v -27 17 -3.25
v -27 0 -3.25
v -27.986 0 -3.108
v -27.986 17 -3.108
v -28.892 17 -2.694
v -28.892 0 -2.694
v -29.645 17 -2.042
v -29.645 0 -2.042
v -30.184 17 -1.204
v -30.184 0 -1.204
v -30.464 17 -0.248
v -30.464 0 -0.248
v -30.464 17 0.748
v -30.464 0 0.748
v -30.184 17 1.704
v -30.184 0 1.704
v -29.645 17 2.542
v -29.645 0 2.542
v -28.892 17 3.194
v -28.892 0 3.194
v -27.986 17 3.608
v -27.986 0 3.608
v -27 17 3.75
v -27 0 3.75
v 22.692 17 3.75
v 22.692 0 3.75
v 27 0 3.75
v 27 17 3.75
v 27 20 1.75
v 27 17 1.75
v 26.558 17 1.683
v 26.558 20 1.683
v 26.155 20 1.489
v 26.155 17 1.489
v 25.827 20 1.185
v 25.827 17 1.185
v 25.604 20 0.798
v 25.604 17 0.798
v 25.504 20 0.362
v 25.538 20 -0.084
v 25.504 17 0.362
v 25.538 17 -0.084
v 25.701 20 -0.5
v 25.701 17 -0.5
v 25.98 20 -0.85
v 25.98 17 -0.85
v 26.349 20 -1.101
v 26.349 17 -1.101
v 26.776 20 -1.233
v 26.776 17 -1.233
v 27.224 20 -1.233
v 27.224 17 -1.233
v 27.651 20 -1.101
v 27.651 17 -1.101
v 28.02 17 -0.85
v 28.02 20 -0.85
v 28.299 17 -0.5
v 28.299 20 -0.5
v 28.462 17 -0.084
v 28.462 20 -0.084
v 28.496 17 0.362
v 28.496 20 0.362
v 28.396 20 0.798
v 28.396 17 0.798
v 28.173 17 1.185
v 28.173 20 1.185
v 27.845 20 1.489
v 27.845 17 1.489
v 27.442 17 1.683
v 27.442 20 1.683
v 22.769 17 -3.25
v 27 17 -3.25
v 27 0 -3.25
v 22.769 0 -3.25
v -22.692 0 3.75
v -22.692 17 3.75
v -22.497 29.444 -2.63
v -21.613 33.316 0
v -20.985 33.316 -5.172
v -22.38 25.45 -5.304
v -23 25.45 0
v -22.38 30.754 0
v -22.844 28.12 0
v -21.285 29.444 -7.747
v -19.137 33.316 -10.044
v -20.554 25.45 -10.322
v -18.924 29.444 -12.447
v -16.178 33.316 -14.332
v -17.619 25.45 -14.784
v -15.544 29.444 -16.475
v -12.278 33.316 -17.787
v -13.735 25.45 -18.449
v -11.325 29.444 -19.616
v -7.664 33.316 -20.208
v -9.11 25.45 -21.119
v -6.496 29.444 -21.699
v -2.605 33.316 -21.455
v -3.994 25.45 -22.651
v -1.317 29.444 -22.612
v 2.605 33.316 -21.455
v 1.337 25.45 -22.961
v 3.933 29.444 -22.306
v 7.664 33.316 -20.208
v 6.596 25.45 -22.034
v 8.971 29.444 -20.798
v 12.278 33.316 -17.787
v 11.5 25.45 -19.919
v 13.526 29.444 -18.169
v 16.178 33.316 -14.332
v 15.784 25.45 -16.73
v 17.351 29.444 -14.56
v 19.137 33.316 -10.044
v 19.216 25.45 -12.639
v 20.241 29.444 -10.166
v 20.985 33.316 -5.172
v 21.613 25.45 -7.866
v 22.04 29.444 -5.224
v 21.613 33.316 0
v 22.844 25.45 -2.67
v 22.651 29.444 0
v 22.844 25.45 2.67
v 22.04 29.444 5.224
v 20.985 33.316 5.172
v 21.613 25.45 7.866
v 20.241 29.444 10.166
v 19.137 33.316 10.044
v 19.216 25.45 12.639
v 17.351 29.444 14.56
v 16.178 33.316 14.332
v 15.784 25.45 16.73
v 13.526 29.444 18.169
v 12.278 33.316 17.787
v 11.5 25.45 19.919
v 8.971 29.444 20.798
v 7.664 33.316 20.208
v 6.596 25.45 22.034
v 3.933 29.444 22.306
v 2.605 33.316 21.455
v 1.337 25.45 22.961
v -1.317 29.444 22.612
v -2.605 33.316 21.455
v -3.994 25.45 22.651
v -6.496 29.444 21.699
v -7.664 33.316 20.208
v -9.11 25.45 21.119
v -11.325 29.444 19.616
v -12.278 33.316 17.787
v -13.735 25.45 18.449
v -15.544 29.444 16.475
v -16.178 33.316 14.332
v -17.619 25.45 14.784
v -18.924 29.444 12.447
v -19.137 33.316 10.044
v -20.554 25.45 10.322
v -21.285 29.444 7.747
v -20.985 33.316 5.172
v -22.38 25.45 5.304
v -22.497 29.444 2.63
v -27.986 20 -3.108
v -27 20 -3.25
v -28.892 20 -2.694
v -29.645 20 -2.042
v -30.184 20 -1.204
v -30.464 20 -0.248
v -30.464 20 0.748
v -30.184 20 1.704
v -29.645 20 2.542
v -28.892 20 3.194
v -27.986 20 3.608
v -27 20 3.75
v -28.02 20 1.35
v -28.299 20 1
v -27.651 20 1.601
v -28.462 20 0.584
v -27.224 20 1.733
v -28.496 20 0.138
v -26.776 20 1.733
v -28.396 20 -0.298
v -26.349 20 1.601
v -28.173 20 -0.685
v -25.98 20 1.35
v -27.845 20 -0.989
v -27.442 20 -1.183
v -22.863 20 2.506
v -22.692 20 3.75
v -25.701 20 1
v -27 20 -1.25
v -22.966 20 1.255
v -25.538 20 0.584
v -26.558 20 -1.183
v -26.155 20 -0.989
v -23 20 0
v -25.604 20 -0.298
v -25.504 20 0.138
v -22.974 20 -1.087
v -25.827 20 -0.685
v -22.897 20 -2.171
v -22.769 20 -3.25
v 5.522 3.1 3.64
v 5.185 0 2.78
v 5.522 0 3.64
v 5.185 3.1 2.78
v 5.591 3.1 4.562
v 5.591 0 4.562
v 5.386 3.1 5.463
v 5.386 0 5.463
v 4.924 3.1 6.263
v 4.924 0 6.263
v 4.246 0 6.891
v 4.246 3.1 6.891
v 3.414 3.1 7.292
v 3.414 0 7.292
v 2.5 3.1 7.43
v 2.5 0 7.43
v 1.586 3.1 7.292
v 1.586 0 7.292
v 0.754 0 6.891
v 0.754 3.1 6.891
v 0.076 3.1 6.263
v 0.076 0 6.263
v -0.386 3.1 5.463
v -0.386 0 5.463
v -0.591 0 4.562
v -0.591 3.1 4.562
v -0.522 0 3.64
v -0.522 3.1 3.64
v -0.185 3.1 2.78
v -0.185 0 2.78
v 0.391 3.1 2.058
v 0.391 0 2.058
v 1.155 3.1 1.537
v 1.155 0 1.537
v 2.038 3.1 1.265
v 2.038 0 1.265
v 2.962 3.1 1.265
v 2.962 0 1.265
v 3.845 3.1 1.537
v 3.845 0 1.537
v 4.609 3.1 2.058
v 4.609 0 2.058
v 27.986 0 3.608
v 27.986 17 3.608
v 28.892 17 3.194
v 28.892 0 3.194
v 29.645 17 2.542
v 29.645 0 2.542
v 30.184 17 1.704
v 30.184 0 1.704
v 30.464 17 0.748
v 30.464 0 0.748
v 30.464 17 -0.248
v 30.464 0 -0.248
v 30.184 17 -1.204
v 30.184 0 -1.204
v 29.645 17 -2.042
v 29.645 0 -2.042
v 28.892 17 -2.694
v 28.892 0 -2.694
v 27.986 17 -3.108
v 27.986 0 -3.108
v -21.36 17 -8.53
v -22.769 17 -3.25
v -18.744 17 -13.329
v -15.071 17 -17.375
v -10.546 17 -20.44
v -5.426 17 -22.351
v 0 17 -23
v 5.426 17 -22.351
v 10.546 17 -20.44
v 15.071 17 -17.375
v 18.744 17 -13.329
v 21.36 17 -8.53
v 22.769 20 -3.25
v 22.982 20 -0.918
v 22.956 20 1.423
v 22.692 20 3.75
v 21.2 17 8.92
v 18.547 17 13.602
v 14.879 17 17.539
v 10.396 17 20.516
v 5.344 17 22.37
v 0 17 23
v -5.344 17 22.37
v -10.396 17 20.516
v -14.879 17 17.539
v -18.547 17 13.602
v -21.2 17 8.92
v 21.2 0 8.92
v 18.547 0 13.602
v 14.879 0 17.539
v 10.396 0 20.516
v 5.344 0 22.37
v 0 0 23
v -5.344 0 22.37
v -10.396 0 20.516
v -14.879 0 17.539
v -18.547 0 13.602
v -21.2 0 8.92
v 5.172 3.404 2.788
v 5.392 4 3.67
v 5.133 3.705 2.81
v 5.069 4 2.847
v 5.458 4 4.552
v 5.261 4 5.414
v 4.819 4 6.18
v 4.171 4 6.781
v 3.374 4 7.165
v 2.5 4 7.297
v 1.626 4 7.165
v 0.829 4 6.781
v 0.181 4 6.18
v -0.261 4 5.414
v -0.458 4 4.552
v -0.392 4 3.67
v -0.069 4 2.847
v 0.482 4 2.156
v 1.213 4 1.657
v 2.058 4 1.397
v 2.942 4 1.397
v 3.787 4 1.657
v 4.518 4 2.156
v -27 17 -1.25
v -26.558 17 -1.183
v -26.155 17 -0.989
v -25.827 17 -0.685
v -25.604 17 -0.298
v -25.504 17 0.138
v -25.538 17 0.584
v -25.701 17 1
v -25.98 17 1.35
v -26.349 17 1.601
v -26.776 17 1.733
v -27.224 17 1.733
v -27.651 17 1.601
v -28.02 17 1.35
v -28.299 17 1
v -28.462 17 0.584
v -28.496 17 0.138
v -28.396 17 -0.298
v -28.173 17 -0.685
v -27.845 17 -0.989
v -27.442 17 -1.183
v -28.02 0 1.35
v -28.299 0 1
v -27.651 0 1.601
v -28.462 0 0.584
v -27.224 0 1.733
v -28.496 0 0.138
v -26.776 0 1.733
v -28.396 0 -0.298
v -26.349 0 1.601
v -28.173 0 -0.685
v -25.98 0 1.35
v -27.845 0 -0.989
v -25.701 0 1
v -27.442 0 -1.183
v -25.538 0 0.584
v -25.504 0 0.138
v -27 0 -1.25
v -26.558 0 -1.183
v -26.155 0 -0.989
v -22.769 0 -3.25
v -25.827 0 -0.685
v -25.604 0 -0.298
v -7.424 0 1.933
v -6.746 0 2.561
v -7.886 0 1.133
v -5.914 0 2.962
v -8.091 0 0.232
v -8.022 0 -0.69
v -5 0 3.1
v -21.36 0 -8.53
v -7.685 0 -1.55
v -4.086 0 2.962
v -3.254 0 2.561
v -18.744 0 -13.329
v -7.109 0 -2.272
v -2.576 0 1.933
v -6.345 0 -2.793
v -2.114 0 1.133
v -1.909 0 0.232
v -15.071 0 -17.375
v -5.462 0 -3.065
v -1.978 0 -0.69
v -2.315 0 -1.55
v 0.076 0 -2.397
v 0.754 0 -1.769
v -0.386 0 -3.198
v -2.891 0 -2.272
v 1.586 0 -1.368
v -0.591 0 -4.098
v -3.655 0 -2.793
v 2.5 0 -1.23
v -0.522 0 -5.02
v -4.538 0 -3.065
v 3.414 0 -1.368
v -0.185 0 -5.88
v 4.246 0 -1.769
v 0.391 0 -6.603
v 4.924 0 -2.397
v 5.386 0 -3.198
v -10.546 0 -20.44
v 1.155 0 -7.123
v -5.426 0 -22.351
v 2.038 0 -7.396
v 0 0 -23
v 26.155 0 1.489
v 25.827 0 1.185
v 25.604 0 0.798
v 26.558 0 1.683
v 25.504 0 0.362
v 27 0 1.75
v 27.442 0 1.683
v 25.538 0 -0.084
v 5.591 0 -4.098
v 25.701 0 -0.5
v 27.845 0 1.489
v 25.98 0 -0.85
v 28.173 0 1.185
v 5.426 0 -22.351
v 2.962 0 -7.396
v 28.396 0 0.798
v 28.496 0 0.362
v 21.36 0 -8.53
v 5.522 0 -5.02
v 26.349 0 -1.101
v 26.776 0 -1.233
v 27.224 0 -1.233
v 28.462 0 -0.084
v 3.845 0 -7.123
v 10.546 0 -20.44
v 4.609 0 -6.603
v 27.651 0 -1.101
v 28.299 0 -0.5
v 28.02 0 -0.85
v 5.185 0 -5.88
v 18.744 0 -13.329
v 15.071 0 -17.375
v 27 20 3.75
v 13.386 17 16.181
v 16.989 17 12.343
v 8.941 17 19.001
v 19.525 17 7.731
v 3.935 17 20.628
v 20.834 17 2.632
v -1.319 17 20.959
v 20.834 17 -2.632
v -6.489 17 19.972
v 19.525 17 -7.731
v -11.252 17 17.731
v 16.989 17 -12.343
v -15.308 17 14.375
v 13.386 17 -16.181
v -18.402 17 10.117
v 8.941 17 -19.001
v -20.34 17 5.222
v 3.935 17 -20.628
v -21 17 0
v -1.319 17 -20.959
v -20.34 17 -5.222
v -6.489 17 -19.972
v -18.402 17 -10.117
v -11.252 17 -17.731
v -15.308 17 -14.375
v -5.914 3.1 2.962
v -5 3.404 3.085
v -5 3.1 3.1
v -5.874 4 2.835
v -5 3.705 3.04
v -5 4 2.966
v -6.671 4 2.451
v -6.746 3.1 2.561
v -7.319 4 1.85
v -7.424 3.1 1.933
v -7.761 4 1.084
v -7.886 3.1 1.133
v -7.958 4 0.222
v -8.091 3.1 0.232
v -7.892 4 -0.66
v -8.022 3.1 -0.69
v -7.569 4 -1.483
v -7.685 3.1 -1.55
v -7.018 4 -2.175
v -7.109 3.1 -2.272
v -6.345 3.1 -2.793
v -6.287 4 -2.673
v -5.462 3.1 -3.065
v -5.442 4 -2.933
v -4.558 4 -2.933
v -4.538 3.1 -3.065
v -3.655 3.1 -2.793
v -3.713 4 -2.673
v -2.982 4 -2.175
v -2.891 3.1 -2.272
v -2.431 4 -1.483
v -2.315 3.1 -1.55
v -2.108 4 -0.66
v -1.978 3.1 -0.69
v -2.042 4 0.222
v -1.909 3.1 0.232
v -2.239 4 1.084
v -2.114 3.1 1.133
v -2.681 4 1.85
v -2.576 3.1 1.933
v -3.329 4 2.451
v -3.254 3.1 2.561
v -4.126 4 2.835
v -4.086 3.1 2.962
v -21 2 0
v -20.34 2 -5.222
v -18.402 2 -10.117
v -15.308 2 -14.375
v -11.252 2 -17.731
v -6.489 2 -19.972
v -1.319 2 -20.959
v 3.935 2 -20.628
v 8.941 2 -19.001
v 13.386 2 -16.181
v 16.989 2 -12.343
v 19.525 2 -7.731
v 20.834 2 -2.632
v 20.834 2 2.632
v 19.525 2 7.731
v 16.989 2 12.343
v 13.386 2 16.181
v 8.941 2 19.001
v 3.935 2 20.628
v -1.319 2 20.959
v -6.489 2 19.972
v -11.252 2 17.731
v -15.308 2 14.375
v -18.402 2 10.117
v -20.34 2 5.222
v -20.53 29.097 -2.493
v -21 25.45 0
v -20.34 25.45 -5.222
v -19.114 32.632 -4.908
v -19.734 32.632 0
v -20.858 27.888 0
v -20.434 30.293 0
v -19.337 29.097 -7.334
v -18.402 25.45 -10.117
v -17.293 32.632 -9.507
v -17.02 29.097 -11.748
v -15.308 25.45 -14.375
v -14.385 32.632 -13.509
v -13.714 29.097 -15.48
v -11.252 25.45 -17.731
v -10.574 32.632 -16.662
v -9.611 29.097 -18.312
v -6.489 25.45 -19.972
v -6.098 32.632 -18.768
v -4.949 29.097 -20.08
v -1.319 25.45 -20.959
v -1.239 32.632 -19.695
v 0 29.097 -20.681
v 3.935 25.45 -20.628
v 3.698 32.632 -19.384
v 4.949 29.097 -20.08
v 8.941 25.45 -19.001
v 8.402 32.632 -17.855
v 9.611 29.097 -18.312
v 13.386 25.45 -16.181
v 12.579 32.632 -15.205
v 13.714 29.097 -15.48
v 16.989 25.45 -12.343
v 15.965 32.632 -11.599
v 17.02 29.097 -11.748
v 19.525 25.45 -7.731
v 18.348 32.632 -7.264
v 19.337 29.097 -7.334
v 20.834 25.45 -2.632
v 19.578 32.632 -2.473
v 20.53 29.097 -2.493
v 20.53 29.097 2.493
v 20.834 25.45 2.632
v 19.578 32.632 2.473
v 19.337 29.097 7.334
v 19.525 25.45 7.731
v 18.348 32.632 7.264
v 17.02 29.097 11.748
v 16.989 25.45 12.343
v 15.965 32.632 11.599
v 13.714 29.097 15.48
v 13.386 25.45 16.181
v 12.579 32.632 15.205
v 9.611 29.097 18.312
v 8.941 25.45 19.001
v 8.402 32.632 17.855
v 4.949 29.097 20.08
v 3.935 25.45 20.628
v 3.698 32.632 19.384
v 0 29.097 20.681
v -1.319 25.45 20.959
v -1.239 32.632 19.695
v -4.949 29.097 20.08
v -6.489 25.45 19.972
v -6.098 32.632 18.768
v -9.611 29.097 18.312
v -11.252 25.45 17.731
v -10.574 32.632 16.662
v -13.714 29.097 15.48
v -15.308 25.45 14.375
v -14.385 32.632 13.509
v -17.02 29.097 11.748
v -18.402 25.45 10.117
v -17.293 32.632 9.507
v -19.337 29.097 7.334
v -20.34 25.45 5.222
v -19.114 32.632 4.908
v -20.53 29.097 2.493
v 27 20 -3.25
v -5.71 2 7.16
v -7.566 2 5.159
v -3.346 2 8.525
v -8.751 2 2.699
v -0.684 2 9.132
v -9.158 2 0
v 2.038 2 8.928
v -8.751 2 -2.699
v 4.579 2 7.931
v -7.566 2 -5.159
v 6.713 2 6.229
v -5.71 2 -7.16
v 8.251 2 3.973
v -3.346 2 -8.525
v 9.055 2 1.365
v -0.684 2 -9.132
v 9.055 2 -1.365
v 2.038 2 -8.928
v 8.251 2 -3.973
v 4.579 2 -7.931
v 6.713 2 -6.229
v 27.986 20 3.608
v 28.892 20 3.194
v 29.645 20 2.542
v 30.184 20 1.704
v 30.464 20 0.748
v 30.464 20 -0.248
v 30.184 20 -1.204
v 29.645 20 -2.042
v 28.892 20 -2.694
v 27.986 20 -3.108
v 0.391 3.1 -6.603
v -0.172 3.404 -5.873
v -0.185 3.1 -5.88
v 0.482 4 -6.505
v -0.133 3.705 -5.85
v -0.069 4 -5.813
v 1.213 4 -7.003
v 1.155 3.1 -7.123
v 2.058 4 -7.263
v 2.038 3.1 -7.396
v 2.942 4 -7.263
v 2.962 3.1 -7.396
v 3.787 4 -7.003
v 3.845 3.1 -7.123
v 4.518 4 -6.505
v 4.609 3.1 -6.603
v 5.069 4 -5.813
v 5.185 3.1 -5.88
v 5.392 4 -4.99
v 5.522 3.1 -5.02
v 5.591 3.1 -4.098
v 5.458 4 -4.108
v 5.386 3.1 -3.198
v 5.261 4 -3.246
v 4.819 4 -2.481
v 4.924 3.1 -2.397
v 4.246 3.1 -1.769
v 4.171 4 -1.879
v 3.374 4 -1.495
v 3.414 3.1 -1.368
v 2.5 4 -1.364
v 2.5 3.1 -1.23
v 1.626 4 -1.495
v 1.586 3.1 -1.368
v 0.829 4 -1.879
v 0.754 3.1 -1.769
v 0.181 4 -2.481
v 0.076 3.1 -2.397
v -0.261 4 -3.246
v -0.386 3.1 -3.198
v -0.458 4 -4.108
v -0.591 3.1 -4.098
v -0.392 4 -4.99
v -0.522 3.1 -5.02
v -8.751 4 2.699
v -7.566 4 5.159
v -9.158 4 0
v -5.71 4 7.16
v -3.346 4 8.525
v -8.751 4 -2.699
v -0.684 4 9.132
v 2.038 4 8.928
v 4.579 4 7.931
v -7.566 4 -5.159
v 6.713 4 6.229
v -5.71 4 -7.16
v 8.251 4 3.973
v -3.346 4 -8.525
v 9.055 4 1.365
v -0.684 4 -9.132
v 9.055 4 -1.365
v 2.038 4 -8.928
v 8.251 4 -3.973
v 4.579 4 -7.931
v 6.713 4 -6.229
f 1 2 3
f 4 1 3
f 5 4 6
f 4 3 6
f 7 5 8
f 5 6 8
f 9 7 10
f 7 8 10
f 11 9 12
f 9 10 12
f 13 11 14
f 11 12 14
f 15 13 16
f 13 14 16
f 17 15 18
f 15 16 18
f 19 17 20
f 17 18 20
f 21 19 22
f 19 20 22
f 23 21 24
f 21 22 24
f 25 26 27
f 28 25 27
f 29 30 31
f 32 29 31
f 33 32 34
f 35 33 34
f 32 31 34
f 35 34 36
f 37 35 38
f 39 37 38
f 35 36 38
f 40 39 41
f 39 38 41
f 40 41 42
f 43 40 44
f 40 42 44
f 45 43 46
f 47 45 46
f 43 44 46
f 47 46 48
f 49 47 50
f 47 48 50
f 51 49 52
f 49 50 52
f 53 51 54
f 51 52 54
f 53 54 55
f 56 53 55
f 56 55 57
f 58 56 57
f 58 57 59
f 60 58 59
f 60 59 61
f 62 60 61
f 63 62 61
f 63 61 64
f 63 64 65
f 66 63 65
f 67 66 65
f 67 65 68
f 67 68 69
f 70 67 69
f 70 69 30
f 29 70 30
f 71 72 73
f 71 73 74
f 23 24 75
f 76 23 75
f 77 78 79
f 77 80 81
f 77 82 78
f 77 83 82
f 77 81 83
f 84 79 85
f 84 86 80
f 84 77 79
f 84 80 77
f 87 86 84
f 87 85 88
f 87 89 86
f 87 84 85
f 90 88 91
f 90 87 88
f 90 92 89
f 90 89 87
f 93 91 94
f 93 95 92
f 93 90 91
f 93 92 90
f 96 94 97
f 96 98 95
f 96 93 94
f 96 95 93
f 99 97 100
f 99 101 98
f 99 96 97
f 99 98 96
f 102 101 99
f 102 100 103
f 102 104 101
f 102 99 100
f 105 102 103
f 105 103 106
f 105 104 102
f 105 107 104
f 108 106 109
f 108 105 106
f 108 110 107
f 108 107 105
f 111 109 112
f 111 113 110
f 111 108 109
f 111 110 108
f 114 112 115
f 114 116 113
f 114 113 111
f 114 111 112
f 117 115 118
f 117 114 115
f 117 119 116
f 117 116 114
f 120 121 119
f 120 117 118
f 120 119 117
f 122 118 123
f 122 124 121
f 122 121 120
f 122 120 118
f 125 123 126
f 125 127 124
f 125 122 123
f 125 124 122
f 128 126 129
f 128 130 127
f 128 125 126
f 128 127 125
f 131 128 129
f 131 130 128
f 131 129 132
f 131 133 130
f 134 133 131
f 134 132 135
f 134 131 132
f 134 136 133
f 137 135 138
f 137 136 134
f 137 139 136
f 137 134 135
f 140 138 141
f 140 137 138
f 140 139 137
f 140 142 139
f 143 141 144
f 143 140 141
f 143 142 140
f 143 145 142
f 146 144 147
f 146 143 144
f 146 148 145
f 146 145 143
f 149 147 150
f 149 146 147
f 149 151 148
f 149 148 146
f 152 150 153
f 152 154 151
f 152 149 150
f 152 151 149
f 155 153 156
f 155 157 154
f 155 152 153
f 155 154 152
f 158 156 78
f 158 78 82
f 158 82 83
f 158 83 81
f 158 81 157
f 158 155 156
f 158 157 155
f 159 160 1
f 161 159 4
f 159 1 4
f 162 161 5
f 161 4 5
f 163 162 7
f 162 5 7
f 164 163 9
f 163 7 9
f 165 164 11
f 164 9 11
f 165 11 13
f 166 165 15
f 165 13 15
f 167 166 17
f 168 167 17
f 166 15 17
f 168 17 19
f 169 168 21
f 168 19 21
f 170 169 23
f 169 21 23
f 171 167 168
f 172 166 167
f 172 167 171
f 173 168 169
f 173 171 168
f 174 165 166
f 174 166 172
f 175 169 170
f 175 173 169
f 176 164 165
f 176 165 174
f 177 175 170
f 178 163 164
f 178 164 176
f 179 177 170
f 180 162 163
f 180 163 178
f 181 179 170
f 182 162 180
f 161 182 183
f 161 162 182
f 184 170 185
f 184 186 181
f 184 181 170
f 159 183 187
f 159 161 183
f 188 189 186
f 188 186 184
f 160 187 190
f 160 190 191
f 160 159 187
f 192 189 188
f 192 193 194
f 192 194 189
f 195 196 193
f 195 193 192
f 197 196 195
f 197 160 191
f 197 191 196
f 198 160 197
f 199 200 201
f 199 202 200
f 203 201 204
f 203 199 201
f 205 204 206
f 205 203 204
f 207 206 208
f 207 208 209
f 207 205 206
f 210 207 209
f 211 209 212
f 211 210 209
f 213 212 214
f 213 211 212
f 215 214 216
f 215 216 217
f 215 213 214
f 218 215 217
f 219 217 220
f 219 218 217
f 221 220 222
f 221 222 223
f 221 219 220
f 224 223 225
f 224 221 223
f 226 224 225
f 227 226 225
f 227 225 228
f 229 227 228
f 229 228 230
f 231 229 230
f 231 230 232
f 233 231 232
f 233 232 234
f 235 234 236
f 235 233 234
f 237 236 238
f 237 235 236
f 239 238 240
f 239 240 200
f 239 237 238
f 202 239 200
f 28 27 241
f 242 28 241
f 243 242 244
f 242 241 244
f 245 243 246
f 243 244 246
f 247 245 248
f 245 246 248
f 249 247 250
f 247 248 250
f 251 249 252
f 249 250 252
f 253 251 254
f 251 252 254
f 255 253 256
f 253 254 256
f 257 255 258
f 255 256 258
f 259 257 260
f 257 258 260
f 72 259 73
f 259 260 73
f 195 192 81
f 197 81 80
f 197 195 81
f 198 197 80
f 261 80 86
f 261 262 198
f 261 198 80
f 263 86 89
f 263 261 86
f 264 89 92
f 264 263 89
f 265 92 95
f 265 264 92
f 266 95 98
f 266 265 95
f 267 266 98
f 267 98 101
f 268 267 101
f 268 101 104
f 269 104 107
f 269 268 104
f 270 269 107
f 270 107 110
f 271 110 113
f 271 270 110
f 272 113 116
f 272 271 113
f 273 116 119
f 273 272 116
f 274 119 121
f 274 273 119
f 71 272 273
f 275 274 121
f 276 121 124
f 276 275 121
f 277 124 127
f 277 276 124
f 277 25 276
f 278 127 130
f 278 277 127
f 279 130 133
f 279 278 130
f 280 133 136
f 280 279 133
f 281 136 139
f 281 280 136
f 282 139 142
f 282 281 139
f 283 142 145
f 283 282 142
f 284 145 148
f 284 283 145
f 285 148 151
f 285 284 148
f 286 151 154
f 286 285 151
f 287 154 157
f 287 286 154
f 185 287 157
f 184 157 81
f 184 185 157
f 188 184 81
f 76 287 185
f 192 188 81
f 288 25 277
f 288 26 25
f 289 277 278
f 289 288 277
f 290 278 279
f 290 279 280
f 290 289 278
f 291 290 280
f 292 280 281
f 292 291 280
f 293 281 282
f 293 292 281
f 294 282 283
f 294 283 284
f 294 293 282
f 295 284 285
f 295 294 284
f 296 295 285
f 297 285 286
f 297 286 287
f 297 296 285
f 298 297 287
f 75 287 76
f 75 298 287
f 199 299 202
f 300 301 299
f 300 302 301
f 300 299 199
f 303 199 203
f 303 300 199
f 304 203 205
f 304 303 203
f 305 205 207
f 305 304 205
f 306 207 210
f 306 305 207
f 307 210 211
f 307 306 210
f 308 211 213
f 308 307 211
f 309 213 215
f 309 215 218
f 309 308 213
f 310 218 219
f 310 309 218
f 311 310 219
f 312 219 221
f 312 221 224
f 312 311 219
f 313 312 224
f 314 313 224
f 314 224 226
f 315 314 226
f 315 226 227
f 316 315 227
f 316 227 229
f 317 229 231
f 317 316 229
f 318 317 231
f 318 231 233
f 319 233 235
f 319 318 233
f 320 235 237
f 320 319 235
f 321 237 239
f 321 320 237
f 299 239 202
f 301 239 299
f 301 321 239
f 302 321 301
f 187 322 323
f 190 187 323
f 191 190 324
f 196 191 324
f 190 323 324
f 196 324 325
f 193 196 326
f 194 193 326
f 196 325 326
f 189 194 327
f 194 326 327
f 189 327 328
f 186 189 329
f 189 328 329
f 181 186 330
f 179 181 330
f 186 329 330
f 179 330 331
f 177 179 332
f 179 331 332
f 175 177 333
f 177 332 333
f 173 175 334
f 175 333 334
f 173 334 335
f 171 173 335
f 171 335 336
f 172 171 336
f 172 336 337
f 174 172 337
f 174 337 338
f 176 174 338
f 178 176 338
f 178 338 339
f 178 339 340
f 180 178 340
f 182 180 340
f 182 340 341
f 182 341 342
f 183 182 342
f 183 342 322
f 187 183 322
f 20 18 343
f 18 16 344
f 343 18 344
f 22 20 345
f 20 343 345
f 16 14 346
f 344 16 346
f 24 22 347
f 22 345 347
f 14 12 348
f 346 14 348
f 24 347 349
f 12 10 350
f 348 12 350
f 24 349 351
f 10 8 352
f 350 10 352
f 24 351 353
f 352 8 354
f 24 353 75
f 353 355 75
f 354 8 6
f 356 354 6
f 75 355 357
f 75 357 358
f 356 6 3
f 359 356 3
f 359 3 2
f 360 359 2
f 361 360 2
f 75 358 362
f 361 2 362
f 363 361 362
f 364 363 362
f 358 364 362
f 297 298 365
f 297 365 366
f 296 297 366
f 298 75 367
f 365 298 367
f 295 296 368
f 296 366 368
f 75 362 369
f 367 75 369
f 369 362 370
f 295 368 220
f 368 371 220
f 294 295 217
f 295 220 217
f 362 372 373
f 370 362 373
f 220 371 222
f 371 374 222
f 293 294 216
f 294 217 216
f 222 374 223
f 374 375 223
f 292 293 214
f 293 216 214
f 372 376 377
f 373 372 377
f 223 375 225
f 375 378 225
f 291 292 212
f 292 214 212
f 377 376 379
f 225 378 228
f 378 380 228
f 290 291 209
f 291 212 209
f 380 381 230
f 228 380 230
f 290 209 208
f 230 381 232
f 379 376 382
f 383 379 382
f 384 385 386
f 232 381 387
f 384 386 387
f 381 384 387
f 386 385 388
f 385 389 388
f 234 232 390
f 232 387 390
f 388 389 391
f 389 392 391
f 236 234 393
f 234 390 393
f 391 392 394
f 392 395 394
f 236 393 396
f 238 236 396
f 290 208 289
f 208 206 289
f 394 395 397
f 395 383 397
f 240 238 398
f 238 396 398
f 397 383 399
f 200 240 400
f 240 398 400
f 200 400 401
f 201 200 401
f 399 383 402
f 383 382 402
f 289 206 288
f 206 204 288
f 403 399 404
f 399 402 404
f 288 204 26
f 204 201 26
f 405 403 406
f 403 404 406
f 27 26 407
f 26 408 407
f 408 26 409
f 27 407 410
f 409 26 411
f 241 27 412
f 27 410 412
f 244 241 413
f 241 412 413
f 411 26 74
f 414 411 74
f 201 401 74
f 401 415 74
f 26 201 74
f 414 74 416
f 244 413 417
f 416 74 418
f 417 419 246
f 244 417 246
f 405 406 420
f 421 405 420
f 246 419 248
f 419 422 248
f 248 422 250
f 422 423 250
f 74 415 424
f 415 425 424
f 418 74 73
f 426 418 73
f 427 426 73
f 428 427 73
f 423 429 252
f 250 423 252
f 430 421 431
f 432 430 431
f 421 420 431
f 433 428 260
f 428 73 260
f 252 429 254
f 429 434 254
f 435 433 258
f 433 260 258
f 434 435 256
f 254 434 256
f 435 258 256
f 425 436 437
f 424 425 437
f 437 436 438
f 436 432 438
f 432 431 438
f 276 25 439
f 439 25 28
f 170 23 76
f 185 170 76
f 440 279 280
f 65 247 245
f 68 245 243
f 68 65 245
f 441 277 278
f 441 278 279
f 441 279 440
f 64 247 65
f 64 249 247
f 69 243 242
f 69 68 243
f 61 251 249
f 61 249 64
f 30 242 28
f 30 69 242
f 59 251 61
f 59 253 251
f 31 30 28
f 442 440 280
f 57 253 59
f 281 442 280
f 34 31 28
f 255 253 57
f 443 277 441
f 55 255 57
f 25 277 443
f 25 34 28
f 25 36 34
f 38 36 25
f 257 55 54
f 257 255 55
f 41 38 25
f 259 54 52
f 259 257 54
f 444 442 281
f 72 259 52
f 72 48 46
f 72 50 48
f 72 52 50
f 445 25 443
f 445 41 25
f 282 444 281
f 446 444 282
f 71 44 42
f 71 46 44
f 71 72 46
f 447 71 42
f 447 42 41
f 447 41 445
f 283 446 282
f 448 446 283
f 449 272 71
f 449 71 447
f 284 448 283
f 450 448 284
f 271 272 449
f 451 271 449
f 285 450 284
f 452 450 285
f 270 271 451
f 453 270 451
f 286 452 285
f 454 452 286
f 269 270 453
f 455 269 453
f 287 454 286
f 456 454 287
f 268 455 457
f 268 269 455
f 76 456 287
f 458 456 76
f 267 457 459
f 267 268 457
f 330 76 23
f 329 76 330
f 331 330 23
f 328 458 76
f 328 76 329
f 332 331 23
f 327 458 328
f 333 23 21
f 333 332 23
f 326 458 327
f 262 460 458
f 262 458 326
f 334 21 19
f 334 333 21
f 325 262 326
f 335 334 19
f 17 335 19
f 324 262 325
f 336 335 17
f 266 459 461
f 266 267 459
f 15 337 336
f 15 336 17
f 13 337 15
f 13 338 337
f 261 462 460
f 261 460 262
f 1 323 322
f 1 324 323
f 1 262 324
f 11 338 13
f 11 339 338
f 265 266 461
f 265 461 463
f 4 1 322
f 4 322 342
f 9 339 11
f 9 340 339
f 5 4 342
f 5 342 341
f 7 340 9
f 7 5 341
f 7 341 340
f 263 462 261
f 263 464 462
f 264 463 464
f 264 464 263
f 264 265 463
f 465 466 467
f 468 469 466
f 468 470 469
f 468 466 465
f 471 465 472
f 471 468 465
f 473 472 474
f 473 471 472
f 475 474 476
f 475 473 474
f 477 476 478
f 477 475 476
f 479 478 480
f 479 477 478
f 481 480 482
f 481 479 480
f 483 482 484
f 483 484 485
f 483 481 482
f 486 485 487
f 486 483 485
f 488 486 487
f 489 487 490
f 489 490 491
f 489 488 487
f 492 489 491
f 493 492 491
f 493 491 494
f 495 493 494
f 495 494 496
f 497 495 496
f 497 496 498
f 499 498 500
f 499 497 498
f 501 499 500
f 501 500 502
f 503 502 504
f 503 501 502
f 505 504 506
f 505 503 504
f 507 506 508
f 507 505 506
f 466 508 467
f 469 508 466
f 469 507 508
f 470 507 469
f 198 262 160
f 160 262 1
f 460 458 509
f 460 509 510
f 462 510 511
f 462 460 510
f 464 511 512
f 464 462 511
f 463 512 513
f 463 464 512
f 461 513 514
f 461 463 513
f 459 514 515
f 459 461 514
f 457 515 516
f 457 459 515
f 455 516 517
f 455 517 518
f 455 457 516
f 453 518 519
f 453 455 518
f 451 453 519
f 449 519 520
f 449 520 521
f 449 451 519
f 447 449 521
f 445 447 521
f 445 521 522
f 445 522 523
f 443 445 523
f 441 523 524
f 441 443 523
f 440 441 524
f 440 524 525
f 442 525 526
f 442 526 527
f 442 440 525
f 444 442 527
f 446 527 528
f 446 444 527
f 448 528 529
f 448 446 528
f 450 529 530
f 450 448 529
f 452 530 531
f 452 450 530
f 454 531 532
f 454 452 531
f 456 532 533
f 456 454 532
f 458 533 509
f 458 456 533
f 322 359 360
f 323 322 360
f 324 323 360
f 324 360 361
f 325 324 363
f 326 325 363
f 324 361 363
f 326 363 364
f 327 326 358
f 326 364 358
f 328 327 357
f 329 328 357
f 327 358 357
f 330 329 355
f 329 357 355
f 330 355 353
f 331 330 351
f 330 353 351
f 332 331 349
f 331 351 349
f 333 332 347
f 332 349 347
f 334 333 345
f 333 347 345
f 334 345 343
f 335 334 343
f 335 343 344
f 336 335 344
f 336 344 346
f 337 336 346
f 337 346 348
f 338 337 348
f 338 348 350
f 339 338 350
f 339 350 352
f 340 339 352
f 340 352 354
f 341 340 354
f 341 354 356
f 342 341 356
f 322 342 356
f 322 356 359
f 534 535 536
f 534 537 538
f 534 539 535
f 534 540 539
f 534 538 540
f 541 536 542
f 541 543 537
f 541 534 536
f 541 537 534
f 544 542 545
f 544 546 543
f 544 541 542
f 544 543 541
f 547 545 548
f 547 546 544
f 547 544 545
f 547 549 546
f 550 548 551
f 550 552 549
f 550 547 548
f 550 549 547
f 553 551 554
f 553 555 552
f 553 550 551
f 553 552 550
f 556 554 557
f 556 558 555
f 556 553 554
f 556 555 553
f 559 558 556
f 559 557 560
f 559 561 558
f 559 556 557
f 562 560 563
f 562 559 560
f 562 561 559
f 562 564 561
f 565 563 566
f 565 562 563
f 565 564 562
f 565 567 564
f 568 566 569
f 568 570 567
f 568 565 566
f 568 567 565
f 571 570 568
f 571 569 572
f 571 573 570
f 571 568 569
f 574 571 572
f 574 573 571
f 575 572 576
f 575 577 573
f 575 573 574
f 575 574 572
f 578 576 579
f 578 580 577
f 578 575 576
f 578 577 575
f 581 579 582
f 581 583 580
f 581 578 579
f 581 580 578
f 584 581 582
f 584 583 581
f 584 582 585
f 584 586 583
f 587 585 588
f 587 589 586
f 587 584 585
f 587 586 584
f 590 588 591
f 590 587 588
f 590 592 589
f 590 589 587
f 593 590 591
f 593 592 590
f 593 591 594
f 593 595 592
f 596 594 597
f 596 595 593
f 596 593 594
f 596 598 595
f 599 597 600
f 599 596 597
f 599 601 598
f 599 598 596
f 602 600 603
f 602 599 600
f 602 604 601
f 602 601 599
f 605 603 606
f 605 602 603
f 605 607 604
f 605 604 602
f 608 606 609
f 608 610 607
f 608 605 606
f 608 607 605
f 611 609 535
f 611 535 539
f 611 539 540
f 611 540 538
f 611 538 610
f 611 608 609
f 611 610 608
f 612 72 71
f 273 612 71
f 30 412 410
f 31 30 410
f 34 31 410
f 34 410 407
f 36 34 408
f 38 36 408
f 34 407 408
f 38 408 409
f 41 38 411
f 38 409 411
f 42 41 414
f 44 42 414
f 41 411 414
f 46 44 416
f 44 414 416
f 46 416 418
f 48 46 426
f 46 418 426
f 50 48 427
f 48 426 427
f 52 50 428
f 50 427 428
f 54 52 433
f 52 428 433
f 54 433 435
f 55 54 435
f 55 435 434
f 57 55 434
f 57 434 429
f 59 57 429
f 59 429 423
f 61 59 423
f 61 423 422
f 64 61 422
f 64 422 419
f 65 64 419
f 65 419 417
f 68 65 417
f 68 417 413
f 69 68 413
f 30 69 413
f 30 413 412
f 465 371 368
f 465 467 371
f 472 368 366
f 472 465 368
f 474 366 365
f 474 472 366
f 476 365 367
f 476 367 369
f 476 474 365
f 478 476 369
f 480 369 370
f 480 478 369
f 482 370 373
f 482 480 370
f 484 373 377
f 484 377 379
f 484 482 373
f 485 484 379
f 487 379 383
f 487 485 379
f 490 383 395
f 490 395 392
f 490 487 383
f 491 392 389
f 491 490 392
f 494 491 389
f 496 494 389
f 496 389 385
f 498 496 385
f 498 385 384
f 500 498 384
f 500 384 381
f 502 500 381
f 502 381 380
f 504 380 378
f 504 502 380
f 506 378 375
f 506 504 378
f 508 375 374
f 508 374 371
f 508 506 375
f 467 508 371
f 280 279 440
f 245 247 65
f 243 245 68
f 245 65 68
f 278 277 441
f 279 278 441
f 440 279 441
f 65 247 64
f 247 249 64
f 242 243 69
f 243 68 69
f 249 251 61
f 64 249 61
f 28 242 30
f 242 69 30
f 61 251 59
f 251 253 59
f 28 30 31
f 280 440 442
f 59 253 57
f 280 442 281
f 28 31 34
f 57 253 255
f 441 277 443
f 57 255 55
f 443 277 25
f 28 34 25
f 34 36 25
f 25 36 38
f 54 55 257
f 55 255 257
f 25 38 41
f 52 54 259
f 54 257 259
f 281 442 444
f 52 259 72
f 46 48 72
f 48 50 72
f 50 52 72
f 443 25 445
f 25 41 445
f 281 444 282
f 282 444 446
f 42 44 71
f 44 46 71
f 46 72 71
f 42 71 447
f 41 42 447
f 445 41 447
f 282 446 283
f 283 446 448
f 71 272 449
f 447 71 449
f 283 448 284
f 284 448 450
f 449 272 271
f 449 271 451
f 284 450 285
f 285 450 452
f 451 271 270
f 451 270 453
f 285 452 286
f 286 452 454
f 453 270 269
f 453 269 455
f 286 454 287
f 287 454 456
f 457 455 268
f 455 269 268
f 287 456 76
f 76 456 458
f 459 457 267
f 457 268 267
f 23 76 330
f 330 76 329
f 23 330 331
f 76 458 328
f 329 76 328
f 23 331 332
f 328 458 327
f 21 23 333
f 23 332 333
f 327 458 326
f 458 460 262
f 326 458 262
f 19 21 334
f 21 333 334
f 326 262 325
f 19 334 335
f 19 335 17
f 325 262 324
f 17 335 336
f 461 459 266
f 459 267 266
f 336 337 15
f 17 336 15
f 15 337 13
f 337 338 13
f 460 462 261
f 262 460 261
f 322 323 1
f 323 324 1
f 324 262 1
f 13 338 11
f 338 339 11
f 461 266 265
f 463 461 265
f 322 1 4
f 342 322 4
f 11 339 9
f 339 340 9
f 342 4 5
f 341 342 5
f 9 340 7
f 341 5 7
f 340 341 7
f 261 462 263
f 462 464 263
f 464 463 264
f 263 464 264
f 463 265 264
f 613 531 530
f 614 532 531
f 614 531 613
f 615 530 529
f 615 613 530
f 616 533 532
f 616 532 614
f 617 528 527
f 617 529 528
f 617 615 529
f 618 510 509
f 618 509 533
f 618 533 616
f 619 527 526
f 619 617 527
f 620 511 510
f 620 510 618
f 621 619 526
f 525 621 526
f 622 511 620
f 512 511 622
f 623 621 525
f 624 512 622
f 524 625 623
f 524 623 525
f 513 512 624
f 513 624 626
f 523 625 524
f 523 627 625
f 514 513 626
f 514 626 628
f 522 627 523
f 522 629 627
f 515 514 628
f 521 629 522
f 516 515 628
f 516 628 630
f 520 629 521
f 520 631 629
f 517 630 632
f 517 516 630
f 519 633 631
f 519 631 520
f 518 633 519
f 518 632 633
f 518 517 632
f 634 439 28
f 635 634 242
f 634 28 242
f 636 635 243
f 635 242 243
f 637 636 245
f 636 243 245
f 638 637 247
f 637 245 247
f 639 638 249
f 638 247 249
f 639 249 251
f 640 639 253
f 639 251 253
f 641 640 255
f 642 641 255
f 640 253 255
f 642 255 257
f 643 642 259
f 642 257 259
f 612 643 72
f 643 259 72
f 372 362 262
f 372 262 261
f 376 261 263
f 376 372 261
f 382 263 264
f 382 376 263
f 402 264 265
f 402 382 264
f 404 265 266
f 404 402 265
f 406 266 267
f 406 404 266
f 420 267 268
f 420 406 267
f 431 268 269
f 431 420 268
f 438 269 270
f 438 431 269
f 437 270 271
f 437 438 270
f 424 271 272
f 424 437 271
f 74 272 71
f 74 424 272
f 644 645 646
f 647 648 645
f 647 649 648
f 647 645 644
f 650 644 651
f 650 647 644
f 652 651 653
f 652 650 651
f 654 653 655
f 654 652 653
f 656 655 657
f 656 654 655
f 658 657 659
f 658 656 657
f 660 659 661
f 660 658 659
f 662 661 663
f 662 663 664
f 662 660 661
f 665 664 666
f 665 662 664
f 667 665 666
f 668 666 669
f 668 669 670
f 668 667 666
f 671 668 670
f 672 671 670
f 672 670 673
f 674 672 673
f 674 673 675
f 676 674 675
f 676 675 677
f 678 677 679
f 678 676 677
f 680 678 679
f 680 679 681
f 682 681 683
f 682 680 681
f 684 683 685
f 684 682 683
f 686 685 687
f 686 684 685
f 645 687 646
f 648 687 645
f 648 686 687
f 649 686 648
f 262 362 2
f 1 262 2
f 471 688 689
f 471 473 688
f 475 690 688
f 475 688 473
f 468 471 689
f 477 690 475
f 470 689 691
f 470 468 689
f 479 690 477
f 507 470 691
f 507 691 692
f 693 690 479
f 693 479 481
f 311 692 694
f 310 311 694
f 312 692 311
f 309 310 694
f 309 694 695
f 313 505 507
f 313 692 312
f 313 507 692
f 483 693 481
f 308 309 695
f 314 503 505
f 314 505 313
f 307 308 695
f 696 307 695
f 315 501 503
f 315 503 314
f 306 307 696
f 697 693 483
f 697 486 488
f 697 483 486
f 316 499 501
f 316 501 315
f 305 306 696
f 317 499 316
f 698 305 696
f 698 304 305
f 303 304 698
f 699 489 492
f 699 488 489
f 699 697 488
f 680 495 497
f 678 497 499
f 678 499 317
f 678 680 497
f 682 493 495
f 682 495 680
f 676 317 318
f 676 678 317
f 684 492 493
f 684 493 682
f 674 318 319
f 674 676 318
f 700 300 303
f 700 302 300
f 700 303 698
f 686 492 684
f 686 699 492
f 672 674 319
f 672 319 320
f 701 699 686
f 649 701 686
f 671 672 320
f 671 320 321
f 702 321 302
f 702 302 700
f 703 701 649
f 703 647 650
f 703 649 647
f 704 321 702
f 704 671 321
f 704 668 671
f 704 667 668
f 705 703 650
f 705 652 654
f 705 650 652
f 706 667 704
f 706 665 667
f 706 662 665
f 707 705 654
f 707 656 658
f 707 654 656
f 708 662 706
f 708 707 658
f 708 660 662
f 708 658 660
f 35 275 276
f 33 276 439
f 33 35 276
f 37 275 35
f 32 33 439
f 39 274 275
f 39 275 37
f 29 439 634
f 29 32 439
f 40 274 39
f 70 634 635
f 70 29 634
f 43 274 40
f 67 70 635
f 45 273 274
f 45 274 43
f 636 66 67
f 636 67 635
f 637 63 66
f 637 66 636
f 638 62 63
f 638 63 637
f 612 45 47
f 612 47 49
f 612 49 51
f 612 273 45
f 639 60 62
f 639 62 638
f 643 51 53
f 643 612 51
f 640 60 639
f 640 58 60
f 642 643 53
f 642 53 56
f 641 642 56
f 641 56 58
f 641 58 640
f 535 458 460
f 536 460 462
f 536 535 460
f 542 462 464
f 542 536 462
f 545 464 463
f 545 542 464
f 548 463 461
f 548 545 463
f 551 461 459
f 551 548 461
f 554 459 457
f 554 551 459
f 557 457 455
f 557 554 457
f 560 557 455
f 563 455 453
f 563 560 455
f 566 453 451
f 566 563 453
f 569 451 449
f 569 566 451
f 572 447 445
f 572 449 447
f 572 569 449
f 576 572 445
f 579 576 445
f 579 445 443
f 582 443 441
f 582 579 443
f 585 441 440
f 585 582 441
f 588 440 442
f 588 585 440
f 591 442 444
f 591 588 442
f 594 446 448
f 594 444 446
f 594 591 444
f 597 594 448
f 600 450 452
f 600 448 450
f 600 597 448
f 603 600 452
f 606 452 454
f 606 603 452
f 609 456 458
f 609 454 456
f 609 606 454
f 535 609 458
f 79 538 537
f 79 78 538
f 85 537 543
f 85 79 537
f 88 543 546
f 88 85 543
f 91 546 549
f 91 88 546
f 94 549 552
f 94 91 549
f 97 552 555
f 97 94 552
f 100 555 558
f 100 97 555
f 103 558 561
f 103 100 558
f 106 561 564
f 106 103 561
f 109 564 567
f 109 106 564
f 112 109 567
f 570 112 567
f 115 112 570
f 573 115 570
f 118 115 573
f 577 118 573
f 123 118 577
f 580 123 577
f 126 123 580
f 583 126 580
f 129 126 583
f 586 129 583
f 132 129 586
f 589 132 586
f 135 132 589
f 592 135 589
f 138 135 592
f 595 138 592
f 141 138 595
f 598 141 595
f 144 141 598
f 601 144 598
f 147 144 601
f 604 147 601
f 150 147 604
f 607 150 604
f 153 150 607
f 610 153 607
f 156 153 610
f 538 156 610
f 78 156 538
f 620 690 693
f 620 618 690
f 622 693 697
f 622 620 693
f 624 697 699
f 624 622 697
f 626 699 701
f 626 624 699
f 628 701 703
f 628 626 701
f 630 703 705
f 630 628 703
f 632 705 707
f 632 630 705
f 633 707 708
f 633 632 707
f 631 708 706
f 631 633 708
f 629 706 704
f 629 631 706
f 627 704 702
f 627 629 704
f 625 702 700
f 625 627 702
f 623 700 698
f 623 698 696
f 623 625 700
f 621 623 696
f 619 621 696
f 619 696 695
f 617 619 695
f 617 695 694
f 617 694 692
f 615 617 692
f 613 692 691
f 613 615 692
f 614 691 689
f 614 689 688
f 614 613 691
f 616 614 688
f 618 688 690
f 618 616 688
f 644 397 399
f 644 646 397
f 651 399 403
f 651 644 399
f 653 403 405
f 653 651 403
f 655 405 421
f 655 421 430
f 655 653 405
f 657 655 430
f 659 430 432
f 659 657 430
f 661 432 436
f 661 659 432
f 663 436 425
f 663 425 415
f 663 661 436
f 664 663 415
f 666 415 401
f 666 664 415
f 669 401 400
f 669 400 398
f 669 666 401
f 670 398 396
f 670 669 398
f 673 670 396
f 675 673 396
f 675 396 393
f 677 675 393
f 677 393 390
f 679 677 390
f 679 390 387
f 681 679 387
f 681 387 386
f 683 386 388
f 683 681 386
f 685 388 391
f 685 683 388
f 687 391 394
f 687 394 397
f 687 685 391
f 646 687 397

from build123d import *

# Parameters (mm, degrees)
SKETCH5_R           = 1.5
BOSS_EXTRUDE3_DEPTH = 20
CIRPATTERN1_COUNT   = 3


with BuildPart() as part:
    # Sketch4 → Revolve1 (revolve)
    with BuildSketch(Plane.XY):
        with BuildLine():
            Line((-21, 2), (-21, 4))
            Line((-21, 4), (-21, 25.449944321))
            ThreePointArc((-21, 25.449944321), (-20.680962813, 29.096556052), (-19.733545037, 32.63236733))
            Line((-19.733545037, 32.63236733), (-21.612930278, 33.316407617))
            ThreePointArc((-21.612930278, 33.316407617), (-22.650578319, 29.443852407), (-23, 25.449944321))
            Line((-23, 25.449944321), (-23, 0))
            Line((-23, 0), (-21, 0))
            Line((-21, 0), (0, 0))
            Line((0, 0), (0, 4))
            Line((0, 4), (-9.157677286, 4))
            Line((-9.157677286, 4), (-9.157677286, 2))
            Line((-9.157677286, 2), (-21, 2))
        make_face()
    revolve(axis=Axis((0, 25.449944321, 0), (0, -1, 0)))

    # Sketch5 → Boss-Extrude3 (add)
    # profile 1 of 2: a face of its own
    with BuildSketch(Plane(origin=(0, 0, 0), x_dir=(-1, 0, 0), z_dir=(0, -1, 0))):
        with BuildLine():
            Line((27, -3.75), (22.692234355, -3.75))
            ThreePointArc((22.692234355, -3.75), (22.998609049, -0.252946238), (22.769222648, 3.25))
            Line((22.769222648, 3.25), (27, 3.25))
            ThreePointArc((27, 3.25), (30.5, -0.25), (27, -3.75))
        make_face()
        with Locations((27, -0.25)):
            Circle(SKETCH5_R, mode=Mode.SUBTRACT)
    # profile 2 of 2: a face of its own
    with BuildSketch(Plane(origin=(0, 0, 0), x_dir=(-1, 0, 0), z_dir=(0, -1, 0))):
        with BuildLine():
            Line((-27, 3.25), (-22.769222648, 3.25))
            ThreePointArc((-22.769222648, 3.25), (-22.998609049, -0.252946238), (-22.692234355, -3.75))
            Line((-22.692234355, -3.75), (-27, -3.75))
            ThreePointArc((-27, -3.75), (-30.5, -0.25), (-27, 3.25))
        make_face()
        with Locations((-27, -0.25)):
            Circle(SKETCH5_R, mode=Mode.SUBTRACT)
    extrude(amount=-BOSS_EXTRUDE3_DEPTH)

    # Sketch7 → Cut-Revolve1 (revolve, cut)
    with BuildSketch(Plane(origin=(0, 0, 0), x_dir=(1, 0, 0), z_dir=(0, 0, -1))):
        with BuildLine():
            Line((-5, 0), (-8.1, 0))
            Line((-8.1, 0), (-8.1, -3.1))
            ThreePointArc((-8.1, -3.1), (-7.192031022, -5.292031022), (-5, -6.2))
            Line((-5, -6.2), (-5, 0))
        make_face()
    cut_revolve1 = revolve(axis=Axis((-5, 6.2, 0), (0, -1, 0)), mode=Mode.SUBTRACT)

    # CirPattern1: Cut-Revolve1 ×3 about axis
    cirpattern1_axis = Axis((0, 34.982227998, 0), (0, -1, 0))
    for i in range(1, CIRPATTERN1_COUNT):
        add(cut_revolve1.rotate(cirpattern1_axis, i * 360 / CIRPATTERN1_COUNT), mode=Mode.SUBTRACT)


with BuildPart() as body_2:
    # Split1: the piece on the far side of the plane
    add(part.part)
    split(bisect_by=Plane(origin=(0, 17, 0), x_dir=(-1, 0, 0), z_dir=(0, -1, 0)), keep=Keep.BOTTOM)


with BuildPart() as part_1:
    add(part.part)

    # Split1
    split(bisect_by=Plane(origin=(0, 17, 0), x_dir=(-1, 0, 0), z_dir=(0, -1, 0)), keep=Keep.TOP)


solid = Compound([body_2.part, part_1.part])
